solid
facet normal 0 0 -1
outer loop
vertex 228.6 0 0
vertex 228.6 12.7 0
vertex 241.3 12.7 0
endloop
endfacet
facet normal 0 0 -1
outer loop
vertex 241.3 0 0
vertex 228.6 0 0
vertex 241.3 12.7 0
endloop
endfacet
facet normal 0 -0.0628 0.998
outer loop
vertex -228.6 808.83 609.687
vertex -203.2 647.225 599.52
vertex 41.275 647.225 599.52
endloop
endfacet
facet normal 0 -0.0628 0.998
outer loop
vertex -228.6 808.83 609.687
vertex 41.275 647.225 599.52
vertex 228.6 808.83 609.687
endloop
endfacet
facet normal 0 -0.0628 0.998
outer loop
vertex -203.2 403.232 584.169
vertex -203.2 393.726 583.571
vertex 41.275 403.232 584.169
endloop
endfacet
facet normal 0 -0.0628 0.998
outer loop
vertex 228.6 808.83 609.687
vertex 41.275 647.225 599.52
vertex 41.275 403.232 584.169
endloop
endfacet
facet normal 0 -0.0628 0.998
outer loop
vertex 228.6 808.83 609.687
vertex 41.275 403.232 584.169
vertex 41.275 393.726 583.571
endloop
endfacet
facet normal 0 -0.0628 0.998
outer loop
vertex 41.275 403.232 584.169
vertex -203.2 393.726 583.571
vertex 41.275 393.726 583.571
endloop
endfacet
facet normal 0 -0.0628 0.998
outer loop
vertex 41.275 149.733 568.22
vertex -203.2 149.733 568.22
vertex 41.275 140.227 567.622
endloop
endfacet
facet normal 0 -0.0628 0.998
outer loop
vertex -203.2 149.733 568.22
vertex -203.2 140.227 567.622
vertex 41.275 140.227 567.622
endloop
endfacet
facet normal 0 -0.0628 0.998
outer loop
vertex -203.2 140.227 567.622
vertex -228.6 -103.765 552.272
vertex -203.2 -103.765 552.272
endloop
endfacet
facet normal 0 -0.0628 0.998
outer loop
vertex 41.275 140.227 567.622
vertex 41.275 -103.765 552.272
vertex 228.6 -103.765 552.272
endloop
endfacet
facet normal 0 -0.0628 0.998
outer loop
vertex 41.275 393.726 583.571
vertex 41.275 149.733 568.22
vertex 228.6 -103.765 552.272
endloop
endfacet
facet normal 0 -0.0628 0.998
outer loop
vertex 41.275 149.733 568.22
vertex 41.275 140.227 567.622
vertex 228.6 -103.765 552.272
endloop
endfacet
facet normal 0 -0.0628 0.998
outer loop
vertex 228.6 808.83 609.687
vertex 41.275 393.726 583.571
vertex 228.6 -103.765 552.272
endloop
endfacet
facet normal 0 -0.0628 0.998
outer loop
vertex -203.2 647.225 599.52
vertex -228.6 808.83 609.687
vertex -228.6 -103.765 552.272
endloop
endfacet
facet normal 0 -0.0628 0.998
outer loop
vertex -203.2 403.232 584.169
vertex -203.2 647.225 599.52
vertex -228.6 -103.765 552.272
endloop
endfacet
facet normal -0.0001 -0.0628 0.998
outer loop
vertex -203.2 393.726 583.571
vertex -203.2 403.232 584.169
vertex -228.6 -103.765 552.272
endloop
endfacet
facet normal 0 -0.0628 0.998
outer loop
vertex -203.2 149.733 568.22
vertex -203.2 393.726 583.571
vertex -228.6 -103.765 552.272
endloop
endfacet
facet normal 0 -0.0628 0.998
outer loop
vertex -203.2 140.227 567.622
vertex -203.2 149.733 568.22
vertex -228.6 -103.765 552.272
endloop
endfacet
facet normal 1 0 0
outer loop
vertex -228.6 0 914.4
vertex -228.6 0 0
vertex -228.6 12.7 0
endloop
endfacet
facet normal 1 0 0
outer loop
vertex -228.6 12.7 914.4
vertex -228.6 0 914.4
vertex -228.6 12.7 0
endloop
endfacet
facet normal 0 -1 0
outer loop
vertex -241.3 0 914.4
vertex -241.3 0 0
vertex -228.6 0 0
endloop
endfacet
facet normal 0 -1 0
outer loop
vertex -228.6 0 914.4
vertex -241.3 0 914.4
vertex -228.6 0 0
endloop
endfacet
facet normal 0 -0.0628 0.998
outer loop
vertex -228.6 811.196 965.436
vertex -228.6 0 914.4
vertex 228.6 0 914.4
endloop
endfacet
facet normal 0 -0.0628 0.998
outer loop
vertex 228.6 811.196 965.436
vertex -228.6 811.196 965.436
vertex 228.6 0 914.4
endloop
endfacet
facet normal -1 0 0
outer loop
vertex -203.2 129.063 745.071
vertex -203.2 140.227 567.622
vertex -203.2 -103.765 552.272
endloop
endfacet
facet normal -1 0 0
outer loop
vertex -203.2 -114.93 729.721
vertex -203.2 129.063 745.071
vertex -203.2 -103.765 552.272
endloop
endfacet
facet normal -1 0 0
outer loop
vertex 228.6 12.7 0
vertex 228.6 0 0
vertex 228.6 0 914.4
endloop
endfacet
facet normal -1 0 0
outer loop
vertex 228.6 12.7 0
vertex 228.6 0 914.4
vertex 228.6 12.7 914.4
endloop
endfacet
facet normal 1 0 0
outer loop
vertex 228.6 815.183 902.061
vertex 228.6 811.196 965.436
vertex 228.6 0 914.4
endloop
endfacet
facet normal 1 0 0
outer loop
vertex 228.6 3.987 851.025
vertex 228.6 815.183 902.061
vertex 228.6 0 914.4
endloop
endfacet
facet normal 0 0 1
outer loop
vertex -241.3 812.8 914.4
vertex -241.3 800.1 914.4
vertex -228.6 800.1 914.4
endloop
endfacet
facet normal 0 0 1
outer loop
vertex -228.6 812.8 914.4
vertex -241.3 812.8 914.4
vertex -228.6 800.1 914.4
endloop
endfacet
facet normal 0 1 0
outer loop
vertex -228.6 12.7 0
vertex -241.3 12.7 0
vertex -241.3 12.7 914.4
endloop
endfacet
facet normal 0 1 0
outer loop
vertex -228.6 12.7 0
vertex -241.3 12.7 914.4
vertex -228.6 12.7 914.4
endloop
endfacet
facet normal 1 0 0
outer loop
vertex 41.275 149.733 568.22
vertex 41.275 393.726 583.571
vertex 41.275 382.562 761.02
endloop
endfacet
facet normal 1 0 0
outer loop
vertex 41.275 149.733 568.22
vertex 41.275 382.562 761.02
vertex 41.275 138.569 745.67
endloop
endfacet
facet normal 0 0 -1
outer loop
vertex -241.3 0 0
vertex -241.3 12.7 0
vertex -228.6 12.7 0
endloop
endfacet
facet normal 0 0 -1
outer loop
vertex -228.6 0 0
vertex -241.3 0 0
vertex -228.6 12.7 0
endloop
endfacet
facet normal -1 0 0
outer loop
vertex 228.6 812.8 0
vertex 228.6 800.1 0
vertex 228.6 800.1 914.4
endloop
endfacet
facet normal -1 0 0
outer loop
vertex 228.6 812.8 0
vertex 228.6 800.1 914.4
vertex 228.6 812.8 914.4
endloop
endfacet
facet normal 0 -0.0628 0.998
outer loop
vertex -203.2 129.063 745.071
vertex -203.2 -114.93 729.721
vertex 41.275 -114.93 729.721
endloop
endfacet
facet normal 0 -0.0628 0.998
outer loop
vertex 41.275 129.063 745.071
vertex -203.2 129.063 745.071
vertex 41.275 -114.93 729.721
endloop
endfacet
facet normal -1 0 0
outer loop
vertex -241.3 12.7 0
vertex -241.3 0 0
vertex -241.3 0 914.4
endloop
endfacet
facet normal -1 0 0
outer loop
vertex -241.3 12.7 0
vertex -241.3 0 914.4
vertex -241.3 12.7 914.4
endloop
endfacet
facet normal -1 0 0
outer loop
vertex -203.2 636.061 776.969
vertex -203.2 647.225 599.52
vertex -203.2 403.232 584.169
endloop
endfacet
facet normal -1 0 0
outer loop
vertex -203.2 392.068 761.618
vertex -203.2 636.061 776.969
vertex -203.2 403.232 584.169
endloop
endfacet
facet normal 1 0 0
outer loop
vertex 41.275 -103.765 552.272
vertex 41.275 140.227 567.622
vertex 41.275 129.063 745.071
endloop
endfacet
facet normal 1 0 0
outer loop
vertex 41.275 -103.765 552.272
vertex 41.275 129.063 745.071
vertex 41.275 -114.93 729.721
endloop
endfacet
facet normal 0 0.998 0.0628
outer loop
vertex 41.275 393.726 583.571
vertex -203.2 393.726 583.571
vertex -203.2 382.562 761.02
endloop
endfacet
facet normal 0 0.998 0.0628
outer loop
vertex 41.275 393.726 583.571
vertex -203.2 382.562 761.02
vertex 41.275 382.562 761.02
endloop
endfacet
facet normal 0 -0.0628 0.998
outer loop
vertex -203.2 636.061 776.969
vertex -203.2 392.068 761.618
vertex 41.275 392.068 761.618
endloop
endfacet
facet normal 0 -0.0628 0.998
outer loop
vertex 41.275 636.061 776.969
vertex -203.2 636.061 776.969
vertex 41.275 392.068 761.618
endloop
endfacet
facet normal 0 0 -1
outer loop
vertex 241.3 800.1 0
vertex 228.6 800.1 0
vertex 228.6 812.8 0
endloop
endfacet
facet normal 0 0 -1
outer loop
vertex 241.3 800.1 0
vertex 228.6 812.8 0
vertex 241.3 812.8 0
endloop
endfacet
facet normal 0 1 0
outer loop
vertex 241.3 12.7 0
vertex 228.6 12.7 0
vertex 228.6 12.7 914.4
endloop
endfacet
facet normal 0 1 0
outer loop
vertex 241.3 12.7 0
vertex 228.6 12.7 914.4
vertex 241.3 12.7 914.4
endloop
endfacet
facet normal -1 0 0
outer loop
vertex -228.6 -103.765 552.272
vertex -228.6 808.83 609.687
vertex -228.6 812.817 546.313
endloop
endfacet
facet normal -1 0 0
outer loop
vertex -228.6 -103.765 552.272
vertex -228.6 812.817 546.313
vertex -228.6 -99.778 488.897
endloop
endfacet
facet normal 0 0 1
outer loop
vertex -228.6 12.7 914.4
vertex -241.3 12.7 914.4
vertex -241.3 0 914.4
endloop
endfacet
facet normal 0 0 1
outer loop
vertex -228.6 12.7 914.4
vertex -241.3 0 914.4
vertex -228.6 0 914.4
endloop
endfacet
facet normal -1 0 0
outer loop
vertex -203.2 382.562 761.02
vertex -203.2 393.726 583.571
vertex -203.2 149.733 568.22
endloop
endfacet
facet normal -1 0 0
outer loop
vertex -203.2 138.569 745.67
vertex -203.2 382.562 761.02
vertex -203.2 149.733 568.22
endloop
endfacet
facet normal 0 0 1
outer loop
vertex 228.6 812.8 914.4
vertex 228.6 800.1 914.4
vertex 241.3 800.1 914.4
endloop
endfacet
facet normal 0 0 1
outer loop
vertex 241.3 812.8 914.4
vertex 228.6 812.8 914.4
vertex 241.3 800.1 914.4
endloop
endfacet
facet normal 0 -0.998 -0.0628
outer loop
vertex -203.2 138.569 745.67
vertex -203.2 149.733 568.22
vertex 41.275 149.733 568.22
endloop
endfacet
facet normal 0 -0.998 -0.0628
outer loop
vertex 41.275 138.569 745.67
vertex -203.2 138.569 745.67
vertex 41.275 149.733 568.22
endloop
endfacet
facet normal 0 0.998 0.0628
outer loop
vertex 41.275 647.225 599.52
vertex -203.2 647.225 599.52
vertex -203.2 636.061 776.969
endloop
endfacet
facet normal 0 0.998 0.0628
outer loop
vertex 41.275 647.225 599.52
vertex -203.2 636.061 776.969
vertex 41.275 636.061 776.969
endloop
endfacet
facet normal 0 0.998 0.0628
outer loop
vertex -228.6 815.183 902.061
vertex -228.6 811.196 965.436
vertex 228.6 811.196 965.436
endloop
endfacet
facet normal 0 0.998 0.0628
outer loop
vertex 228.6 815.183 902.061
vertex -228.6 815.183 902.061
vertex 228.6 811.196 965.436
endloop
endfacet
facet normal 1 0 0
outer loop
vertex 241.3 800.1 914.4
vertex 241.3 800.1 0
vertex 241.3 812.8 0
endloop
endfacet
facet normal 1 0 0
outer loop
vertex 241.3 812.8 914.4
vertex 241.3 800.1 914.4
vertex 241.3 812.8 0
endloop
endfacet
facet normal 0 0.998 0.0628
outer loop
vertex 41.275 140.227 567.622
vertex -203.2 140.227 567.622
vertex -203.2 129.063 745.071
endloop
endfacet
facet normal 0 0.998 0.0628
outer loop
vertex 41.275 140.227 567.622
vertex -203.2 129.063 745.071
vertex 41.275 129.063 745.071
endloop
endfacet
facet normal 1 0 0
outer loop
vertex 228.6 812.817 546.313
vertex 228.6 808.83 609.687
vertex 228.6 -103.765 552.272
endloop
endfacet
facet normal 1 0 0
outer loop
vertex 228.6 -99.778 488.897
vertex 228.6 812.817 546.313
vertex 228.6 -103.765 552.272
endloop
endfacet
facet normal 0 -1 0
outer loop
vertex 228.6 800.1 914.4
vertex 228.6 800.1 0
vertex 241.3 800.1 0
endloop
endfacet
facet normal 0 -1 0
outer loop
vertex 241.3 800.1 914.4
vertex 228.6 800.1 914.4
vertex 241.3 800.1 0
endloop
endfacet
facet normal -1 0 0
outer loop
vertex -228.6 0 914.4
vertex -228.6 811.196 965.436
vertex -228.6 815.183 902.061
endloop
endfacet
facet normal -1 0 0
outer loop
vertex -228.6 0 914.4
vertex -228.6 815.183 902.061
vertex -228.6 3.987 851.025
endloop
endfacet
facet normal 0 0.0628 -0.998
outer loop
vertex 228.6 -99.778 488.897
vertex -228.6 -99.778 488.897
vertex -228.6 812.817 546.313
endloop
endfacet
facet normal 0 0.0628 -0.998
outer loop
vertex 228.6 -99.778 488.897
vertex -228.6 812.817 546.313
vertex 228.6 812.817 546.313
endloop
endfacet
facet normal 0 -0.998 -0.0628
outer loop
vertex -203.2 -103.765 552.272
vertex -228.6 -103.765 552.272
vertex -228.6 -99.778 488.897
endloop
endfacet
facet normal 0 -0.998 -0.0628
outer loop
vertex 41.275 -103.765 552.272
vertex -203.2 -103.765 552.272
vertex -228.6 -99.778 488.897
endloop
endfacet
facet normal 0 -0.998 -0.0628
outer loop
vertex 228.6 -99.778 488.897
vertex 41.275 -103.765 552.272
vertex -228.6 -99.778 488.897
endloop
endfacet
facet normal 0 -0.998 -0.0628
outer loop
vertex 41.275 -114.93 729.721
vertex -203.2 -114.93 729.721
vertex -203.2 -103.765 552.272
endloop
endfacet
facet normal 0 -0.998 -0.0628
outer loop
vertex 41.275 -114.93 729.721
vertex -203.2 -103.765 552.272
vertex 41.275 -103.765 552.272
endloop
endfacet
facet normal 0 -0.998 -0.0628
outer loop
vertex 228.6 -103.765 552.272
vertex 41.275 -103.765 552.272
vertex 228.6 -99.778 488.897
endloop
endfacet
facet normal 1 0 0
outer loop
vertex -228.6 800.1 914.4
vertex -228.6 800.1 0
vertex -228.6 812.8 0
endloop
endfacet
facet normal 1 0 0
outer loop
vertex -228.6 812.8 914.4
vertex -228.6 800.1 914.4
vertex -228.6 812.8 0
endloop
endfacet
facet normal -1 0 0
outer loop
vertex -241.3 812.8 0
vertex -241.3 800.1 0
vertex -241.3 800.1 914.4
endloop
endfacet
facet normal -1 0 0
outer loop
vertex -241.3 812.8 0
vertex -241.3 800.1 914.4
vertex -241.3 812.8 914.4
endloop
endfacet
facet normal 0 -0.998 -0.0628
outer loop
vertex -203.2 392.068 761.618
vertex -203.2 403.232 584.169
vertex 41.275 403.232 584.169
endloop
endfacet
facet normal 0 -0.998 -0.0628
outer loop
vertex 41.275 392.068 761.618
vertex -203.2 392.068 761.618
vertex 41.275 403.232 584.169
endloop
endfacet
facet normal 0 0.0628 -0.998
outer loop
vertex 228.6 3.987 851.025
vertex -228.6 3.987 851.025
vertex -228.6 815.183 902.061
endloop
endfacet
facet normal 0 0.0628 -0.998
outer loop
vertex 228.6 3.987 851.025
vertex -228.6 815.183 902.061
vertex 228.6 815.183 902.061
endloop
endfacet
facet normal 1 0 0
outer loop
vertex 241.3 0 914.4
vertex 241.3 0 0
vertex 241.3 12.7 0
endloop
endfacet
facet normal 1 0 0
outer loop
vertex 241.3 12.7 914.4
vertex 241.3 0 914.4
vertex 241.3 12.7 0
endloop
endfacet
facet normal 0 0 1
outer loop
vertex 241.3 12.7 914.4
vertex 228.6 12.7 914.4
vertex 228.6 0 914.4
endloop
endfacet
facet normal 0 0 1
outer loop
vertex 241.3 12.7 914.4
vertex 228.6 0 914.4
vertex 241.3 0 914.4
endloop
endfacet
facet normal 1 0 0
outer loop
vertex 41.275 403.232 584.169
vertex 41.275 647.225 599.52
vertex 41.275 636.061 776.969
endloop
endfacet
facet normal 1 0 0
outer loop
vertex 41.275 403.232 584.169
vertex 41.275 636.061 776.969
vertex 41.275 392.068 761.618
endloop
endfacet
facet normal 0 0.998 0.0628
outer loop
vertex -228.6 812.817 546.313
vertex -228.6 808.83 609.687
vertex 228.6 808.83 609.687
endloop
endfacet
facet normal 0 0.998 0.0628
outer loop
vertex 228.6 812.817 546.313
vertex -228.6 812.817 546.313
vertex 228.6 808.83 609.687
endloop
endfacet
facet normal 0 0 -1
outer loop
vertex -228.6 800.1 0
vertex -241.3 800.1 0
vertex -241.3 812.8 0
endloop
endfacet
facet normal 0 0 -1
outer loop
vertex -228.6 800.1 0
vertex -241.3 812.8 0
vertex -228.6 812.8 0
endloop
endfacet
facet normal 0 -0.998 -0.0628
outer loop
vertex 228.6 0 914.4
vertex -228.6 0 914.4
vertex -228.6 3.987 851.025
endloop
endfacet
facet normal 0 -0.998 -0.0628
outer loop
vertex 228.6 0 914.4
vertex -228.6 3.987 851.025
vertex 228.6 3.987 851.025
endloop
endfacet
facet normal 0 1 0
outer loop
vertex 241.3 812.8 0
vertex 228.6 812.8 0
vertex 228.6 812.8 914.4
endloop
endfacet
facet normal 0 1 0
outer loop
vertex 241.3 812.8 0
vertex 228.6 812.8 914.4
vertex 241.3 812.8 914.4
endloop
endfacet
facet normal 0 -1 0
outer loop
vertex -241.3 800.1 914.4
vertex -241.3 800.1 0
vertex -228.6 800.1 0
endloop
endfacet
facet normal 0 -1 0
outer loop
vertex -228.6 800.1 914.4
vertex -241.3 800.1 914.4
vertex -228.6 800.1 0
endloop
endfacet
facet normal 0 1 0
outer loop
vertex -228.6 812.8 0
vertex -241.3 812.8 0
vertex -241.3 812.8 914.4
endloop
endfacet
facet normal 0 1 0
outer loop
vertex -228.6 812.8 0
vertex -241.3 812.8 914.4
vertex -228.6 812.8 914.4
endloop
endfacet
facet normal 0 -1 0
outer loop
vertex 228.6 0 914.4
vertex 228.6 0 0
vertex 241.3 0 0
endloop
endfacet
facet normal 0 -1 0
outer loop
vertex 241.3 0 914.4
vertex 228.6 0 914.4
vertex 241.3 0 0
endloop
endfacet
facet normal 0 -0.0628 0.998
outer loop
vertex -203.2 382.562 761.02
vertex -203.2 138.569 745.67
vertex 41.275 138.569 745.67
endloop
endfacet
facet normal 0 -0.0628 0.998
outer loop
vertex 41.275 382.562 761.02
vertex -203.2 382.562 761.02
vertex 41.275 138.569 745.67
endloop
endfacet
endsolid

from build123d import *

# Parameters (mm, degrees)
F2_W      = 12.7
F2_H      = 12.7
F3_DEPTH  = 914.4
F6_W      = 457.2
F6_H      = 914.4
F7_DEPTH  = 63.5
F10_W     = 457.2
F10_H     = 812.8
F11_DEPTH = 63.5
F12_W     = 244.475
F12_H     = 244.475
F13_DEPTH = 177.8


# Not quite as in the source:
# - the program builds the solid bodies; features that only make, move or delete a surface that nothing else refers to are left out


with BuildPart() as f3:
    # F2 (on Top) → F3 (new body, through all)
    with BuildSketch(Plane.XY):
        with Locations((-234.95, 6.35)):
            Rectangle(F2_W, F2_H)
    extrude(amount=F3_DEPTH)


with BuildPart() as f3b:
    # F2 (on Top) → F3, piece 2 (new body, through all)
    with BuildSketch(Plane.XY):
        with Locations((234.95, 6.35)):
            Rectangle(F2_W, F2_H)
    extrude(amount=F3_DEPTH)


with BuildPart() as f3c:
    # F2 (on Top) → F3, piece 3 (new body, through all)
    with BuildSketch(Plane.XY):
        with Locations((234.95, 806.45)):
            Rectangle(F2_W, F2_H)
    extrude(amount=F3_DEPTH)


with BuildPart() as f3d:
    # F2 (on Top) → F3, piece 4 (new body, through all)
    with BuildSketch(Plane.XY):
        with Locations((-234.95, 806.45)):
            Rectangle(F2_W, F2_H)
    extrude(amount=F3_DEPTH)


with BuildPart() as f7:
    # F6 (on face) → F7 (new body)
    with BuildSketch(Plane(origin=(0, -35.0181054579, 556.5968475473), x_dir=(1, 0, 0), z_dir=(0, 0.0627905195, -0.9980267284))):
        with Locations((0, -388.3167412758)):
            Rectangle(F6_W, F6_H)
    extrude(amount=F7_DEPTH)

    # F12 (on face) → F13 (join)
    with BuildSketch(Plane(origin=(0, -35.0181054579, 556.5968475473), x_dir=(1, 0, 0), z_dir=(0, 0.0627905195, -0.9980267284))):
        with Locations((-80.9625, -53.3542412758)):
            Rectangle(F12_W, F12_H)
        with Locations((-80.9625, -307.3542412758)):
            Rectangle(F12_W, F12_H)
        with Locations((-80.9625, -561.3542412758)):
            Rectangle(F12_W, F12_H)
    extrude(amount=-F13_DEPTH)


with BuildPart() as f11:
    # F10 (on face) → F11 (new body)
    with BuildSketch(Plane(origin=(0, -57.3023543856, 910.794841441), x_dir=(1, 0, 0), z_dir=(0, 0.0627905195, -0.9980267284))):
        with Locations((0, -463.8156510576)):
            Rectangle(F10_W, F10_H)
    extrude(amount=F11_DEPTH)


solid = Compound([f3.part, f3b.part, f3c.part, f3d.part, f7.part, f11.part])
